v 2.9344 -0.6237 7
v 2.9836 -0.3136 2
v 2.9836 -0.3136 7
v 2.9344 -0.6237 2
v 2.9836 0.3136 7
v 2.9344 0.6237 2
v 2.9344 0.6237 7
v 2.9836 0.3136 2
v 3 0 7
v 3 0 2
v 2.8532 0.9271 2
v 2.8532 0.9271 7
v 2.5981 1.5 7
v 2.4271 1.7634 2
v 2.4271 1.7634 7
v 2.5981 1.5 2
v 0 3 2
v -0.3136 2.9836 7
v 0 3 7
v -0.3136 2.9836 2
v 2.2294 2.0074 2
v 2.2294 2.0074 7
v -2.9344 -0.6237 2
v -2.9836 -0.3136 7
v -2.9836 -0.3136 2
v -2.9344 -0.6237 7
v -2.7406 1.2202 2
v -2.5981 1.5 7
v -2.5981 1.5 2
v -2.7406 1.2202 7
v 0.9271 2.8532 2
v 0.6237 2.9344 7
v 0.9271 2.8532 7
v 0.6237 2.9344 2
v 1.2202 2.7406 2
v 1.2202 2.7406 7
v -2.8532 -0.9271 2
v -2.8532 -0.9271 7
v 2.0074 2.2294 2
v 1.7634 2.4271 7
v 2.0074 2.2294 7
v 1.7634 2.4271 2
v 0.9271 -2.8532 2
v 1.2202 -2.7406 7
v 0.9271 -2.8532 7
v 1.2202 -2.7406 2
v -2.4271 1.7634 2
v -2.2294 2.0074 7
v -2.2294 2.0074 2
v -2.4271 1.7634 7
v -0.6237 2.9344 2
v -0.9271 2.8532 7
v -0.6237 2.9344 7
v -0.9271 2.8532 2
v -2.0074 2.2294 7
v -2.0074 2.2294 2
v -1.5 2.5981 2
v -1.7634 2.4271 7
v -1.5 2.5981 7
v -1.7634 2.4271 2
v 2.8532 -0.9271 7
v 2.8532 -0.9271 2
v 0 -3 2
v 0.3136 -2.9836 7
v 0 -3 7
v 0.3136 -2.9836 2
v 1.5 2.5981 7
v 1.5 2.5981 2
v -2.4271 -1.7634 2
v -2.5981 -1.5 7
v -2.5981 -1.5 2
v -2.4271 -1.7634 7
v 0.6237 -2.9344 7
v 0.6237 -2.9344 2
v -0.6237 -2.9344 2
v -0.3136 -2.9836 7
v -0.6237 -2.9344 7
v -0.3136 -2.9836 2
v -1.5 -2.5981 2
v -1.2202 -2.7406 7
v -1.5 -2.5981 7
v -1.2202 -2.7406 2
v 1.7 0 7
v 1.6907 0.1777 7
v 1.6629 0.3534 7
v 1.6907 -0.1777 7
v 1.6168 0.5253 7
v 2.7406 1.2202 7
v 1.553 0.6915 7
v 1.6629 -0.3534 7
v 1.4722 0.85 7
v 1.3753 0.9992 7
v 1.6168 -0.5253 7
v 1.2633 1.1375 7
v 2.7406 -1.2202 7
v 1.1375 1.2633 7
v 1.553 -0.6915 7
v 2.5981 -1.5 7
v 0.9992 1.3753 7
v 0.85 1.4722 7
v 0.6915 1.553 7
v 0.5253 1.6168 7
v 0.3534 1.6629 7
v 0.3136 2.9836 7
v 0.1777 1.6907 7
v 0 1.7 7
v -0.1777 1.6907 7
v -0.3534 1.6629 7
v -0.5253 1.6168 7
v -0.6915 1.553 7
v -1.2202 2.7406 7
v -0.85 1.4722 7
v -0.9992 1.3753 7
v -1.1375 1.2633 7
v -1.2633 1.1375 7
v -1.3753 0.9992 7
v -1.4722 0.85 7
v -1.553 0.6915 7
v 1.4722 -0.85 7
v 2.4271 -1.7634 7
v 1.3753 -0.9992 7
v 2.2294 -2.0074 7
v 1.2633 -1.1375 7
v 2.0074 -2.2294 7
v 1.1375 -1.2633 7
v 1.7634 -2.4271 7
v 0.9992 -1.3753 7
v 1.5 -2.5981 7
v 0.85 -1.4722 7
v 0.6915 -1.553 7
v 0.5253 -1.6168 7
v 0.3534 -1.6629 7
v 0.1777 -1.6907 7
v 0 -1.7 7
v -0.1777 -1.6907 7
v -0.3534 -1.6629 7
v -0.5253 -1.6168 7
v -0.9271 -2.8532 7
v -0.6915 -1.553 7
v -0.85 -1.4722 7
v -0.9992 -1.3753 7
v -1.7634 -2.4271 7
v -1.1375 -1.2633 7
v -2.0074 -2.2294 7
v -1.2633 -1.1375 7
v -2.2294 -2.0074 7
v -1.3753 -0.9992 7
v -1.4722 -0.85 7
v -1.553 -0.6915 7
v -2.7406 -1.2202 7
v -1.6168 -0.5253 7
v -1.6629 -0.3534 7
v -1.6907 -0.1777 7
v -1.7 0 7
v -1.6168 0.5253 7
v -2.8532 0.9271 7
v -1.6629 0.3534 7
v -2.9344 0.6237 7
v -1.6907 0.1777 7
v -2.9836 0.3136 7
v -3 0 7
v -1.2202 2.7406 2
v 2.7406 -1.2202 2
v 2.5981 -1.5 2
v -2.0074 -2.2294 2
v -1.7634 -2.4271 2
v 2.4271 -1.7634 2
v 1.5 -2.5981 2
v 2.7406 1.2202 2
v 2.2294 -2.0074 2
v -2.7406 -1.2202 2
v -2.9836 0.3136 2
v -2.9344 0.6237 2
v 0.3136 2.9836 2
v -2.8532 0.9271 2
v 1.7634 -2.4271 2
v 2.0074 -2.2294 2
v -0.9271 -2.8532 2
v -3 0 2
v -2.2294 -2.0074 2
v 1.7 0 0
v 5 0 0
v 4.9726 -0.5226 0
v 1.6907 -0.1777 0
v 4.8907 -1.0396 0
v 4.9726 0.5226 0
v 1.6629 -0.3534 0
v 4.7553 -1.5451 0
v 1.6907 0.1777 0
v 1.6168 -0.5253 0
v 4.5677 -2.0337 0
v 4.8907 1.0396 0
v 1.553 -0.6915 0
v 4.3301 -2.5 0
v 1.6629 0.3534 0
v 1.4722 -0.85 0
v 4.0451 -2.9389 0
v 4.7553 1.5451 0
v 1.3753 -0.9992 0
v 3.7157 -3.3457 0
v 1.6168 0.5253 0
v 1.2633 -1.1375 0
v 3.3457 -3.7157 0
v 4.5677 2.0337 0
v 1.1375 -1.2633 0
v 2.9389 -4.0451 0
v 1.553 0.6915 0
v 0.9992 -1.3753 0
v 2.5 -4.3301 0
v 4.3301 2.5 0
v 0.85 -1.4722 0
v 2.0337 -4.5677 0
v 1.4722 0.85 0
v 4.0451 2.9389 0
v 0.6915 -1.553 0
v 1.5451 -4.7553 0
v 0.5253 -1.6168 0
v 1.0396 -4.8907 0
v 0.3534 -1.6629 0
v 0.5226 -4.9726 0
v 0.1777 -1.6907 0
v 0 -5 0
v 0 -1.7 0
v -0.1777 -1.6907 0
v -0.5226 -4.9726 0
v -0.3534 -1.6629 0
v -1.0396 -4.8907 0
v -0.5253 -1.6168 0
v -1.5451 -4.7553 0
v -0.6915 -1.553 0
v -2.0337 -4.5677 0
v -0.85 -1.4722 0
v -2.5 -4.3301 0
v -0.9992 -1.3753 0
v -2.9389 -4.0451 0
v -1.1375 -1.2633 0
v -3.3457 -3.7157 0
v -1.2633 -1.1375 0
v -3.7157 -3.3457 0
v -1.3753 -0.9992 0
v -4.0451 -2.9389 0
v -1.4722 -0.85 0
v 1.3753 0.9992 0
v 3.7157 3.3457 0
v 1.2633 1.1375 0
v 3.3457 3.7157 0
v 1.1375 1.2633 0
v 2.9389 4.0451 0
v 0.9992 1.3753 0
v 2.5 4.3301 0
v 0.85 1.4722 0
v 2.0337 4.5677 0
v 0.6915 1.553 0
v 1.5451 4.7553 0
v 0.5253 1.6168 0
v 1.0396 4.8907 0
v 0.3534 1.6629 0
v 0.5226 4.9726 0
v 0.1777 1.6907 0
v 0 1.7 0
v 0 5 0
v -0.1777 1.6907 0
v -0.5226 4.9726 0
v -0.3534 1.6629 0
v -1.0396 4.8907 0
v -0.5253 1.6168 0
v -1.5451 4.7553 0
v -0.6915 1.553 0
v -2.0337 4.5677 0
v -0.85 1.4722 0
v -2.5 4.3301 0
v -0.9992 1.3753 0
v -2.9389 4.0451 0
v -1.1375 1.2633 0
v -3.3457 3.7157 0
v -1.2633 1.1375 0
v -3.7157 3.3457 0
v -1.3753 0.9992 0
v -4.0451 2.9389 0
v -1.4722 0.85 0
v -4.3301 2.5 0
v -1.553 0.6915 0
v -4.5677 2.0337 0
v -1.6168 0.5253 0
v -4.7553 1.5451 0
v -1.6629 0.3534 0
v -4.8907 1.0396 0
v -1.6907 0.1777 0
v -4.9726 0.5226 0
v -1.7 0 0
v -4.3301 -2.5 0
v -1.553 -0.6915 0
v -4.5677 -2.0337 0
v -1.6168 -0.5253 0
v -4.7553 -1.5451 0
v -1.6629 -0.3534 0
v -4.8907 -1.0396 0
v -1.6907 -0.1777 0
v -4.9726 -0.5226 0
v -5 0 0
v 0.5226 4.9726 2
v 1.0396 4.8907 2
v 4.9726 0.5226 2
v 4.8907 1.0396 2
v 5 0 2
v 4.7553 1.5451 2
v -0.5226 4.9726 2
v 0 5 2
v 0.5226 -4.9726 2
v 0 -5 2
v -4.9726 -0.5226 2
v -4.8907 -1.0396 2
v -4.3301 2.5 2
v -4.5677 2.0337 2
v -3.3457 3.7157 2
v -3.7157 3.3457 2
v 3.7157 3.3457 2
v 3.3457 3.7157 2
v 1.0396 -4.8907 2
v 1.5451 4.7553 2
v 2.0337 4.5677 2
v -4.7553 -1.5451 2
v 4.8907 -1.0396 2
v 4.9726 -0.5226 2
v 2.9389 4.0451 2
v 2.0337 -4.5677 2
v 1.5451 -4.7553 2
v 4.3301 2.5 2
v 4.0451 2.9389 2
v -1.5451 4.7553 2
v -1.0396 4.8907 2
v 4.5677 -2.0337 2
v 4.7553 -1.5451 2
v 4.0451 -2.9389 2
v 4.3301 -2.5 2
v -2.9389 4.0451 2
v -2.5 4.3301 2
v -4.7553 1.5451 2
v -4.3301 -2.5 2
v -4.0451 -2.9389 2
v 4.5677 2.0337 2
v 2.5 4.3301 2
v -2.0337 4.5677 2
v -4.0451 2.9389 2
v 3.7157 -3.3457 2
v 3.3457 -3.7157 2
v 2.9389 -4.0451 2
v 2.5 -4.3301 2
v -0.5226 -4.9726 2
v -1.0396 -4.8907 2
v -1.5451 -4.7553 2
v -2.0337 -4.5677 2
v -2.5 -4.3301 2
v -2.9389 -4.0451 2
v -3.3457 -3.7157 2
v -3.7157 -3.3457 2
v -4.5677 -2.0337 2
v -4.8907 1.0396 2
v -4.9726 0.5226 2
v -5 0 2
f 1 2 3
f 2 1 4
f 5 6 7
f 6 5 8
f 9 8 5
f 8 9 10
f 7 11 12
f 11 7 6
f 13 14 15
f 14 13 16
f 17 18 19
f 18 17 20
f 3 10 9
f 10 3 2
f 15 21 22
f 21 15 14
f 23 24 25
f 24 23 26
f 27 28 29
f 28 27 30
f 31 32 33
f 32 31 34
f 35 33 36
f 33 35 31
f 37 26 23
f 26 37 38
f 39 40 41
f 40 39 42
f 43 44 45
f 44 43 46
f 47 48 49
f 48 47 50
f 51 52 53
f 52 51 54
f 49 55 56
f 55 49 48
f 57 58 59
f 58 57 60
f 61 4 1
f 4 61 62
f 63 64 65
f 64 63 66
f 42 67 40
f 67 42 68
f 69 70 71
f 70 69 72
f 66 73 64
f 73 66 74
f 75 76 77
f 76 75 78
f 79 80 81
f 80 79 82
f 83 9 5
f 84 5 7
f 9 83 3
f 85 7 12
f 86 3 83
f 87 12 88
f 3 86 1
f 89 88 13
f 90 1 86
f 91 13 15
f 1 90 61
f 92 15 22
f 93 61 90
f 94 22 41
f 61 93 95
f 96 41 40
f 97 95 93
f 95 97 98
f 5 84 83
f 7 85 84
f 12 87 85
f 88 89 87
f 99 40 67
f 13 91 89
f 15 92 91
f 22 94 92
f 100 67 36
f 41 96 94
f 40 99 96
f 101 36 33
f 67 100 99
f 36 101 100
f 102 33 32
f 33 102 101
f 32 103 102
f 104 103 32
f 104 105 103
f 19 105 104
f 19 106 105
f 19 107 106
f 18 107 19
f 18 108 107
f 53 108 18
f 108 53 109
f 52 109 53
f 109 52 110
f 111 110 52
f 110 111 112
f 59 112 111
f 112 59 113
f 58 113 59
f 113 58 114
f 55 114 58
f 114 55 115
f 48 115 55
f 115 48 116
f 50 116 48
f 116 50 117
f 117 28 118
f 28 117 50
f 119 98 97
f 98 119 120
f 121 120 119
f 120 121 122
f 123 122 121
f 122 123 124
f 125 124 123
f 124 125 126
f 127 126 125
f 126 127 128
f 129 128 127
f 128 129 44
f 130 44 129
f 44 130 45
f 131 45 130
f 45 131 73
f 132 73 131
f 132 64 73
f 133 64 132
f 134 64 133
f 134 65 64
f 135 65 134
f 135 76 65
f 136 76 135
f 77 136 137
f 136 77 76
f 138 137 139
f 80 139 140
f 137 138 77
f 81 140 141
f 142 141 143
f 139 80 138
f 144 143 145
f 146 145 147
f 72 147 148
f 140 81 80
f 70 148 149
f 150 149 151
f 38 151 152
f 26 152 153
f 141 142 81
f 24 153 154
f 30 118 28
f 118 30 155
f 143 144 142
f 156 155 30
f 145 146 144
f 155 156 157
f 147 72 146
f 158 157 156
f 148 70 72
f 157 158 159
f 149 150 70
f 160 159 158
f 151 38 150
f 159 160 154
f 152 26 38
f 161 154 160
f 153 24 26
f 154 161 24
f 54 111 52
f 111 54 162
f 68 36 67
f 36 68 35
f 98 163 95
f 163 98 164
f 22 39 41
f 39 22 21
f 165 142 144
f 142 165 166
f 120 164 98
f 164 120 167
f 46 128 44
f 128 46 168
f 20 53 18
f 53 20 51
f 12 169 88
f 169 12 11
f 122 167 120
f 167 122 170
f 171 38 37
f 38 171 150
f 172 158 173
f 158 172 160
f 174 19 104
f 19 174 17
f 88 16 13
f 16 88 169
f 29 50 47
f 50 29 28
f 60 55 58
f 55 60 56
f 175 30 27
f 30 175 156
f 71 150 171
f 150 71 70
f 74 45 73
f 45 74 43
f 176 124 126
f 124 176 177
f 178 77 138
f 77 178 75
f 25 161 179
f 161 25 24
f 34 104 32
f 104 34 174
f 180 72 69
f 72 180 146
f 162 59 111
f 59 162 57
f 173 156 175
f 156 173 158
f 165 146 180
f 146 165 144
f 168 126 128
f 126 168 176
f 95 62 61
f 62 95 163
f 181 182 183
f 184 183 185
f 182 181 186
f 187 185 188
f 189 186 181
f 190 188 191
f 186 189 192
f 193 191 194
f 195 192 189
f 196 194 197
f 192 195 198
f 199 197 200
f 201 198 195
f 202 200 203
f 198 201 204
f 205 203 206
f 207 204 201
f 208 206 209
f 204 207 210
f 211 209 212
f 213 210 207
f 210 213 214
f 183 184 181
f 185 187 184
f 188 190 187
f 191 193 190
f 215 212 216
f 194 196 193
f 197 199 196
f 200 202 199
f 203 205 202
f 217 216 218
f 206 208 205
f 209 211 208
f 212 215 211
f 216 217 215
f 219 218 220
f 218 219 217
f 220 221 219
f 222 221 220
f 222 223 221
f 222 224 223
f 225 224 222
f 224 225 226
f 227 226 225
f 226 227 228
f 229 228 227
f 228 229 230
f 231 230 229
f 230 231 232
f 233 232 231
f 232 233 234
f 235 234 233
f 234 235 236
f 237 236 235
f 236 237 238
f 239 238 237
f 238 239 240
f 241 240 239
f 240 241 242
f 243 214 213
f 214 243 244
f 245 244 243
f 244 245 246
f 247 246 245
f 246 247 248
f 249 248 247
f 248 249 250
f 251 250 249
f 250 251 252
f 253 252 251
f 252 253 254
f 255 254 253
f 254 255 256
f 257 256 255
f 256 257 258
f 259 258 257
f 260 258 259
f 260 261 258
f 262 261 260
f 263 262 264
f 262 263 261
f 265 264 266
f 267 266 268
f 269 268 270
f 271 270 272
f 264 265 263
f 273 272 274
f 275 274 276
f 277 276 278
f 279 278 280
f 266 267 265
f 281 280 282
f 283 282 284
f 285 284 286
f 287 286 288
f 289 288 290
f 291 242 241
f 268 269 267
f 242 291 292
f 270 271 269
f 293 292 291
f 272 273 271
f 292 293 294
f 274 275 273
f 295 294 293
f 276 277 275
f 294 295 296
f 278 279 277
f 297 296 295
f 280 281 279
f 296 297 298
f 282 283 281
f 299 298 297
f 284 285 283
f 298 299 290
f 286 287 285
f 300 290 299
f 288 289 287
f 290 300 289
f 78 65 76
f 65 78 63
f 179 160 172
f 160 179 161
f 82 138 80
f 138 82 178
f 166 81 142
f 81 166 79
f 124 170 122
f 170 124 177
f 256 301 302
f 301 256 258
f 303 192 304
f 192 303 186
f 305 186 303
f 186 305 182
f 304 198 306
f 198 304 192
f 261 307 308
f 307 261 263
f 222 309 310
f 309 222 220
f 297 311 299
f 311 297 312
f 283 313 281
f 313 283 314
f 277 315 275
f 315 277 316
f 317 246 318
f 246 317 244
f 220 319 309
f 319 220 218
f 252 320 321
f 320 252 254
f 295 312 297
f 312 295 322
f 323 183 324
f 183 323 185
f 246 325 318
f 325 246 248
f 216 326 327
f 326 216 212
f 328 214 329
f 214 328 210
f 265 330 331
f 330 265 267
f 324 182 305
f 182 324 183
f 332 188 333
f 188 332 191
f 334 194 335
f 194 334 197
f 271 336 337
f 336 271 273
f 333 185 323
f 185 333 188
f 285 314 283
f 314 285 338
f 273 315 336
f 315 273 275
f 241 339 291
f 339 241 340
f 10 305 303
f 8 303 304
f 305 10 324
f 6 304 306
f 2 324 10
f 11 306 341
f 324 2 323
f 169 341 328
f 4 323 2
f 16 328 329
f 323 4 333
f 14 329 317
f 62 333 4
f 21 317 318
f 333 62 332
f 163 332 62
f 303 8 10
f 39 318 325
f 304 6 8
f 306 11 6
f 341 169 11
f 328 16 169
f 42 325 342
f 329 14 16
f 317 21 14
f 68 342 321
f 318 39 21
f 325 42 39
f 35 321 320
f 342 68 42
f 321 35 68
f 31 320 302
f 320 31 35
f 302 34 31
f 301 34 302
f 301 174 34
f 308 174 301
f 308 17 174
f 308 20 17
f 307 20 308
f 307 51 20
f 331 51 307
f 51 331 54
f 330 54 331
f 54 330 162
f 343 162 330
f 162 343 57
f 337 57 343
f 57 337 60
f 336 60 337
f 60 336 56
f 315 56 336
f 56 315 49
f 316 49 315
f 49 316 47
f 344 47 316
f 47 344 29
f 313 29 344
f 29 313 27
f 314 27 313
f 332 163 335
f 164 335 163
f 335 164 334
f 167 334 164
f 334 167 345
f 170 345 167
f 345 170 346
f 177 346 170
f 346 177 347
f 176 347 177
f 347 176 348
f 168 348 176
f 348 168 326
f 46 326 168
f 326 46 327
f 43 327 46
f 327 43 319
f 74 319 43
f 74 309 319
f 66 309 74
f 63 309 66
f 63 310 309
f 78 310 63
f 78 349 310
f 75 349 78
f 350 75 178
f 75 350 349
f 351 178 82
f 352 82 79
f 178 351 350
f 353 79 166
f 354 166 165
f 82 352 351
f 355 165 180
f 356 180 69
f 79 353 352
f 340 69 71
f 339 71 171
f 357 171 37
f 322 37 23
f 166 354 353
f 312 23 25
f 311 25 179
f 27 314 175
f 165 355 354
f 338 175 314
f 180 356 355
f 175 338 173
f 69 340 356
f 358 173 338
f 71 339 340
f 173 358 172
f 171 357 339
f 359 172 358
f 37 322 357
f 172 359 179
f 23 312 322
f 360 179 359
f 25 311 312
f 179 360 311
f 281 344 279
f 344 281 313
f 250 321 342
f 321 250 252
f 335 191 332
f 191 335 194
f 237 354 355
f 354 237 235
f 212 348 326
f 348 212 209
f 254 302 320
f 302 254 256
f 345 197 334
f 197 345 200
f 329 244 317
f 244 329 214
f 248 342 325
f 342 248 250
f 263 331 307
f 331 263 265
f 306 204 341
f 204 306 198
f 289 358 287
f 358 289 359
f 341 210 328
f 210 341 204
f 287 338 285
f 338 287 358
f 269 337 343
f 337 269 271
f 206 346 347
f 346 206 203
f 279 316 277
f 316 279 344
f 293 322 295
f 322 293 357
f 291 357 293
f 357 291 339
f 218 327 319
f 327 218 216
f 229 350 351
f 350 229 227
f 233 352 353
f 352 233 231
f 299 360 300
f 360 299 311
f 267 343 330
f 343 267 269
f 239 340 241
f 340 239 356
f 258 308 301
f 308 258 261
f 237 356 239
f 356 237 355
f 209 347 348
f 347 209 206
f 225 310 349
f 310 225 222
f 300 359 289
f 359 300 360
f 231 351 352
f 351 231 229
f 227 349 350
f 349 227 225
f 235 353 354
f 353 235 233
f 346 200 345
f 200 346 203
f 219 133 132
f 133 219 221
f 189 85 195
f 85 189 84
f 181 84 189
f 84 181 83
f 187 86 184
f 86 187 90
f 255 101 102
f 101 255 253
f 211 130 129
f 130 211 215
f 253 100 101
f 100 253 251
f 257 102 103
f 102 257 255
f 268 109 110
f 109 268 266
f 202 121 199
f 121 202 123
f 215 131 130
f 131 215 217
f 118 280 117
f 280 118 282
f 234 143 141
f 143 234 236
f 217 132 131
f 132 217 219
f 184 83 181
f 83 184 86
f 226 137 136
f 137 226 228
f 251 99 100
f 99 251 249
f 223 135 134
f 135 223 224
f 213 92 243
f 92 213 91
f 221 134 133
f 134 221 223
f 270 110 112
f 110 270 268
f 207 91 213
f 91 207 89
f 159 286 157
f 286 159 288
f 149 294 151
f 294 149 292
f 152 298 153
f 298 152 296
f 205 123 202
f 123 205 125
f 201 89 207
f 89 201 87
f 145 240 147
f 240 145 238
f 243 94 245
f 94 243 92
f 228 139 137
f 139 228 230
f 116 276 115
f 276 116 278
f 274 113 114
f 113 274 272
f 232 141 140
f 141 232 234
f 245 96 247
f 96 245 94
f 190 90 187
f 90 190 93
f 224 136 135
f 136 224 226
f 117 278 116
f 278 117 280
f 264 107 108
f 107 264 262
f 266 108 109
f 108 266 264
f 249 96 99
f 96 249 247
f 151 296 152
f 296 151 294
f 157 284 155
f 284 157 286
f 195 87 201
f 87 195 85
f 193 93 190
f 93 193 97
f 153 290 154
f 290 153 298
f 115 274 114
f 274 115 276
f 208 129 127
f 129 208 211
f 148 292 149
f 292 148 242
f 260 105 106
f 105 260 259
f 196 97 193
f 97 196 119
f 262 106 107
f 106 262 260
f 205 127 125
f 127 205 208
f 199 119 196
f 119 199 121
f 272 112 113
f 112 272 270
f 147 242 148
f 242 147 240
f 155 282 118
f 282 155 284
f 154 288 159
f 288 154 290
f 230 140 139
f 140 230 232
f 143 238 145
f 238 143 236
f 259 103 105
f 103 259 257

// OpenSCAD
// Flanged threaded insert.
$fn = 60;
eps = 0.02;
inner_d = 3.4;
outer_d = 6;
length = 7;
flange_d = 10;
difference() {
    union() { cylinder(d=outer_d,h=length); cylinder(d=flange_d,h=2); }
    translate([0,0,-eps]) cylinder(d=inner_d,h=length+2*eps);
}
